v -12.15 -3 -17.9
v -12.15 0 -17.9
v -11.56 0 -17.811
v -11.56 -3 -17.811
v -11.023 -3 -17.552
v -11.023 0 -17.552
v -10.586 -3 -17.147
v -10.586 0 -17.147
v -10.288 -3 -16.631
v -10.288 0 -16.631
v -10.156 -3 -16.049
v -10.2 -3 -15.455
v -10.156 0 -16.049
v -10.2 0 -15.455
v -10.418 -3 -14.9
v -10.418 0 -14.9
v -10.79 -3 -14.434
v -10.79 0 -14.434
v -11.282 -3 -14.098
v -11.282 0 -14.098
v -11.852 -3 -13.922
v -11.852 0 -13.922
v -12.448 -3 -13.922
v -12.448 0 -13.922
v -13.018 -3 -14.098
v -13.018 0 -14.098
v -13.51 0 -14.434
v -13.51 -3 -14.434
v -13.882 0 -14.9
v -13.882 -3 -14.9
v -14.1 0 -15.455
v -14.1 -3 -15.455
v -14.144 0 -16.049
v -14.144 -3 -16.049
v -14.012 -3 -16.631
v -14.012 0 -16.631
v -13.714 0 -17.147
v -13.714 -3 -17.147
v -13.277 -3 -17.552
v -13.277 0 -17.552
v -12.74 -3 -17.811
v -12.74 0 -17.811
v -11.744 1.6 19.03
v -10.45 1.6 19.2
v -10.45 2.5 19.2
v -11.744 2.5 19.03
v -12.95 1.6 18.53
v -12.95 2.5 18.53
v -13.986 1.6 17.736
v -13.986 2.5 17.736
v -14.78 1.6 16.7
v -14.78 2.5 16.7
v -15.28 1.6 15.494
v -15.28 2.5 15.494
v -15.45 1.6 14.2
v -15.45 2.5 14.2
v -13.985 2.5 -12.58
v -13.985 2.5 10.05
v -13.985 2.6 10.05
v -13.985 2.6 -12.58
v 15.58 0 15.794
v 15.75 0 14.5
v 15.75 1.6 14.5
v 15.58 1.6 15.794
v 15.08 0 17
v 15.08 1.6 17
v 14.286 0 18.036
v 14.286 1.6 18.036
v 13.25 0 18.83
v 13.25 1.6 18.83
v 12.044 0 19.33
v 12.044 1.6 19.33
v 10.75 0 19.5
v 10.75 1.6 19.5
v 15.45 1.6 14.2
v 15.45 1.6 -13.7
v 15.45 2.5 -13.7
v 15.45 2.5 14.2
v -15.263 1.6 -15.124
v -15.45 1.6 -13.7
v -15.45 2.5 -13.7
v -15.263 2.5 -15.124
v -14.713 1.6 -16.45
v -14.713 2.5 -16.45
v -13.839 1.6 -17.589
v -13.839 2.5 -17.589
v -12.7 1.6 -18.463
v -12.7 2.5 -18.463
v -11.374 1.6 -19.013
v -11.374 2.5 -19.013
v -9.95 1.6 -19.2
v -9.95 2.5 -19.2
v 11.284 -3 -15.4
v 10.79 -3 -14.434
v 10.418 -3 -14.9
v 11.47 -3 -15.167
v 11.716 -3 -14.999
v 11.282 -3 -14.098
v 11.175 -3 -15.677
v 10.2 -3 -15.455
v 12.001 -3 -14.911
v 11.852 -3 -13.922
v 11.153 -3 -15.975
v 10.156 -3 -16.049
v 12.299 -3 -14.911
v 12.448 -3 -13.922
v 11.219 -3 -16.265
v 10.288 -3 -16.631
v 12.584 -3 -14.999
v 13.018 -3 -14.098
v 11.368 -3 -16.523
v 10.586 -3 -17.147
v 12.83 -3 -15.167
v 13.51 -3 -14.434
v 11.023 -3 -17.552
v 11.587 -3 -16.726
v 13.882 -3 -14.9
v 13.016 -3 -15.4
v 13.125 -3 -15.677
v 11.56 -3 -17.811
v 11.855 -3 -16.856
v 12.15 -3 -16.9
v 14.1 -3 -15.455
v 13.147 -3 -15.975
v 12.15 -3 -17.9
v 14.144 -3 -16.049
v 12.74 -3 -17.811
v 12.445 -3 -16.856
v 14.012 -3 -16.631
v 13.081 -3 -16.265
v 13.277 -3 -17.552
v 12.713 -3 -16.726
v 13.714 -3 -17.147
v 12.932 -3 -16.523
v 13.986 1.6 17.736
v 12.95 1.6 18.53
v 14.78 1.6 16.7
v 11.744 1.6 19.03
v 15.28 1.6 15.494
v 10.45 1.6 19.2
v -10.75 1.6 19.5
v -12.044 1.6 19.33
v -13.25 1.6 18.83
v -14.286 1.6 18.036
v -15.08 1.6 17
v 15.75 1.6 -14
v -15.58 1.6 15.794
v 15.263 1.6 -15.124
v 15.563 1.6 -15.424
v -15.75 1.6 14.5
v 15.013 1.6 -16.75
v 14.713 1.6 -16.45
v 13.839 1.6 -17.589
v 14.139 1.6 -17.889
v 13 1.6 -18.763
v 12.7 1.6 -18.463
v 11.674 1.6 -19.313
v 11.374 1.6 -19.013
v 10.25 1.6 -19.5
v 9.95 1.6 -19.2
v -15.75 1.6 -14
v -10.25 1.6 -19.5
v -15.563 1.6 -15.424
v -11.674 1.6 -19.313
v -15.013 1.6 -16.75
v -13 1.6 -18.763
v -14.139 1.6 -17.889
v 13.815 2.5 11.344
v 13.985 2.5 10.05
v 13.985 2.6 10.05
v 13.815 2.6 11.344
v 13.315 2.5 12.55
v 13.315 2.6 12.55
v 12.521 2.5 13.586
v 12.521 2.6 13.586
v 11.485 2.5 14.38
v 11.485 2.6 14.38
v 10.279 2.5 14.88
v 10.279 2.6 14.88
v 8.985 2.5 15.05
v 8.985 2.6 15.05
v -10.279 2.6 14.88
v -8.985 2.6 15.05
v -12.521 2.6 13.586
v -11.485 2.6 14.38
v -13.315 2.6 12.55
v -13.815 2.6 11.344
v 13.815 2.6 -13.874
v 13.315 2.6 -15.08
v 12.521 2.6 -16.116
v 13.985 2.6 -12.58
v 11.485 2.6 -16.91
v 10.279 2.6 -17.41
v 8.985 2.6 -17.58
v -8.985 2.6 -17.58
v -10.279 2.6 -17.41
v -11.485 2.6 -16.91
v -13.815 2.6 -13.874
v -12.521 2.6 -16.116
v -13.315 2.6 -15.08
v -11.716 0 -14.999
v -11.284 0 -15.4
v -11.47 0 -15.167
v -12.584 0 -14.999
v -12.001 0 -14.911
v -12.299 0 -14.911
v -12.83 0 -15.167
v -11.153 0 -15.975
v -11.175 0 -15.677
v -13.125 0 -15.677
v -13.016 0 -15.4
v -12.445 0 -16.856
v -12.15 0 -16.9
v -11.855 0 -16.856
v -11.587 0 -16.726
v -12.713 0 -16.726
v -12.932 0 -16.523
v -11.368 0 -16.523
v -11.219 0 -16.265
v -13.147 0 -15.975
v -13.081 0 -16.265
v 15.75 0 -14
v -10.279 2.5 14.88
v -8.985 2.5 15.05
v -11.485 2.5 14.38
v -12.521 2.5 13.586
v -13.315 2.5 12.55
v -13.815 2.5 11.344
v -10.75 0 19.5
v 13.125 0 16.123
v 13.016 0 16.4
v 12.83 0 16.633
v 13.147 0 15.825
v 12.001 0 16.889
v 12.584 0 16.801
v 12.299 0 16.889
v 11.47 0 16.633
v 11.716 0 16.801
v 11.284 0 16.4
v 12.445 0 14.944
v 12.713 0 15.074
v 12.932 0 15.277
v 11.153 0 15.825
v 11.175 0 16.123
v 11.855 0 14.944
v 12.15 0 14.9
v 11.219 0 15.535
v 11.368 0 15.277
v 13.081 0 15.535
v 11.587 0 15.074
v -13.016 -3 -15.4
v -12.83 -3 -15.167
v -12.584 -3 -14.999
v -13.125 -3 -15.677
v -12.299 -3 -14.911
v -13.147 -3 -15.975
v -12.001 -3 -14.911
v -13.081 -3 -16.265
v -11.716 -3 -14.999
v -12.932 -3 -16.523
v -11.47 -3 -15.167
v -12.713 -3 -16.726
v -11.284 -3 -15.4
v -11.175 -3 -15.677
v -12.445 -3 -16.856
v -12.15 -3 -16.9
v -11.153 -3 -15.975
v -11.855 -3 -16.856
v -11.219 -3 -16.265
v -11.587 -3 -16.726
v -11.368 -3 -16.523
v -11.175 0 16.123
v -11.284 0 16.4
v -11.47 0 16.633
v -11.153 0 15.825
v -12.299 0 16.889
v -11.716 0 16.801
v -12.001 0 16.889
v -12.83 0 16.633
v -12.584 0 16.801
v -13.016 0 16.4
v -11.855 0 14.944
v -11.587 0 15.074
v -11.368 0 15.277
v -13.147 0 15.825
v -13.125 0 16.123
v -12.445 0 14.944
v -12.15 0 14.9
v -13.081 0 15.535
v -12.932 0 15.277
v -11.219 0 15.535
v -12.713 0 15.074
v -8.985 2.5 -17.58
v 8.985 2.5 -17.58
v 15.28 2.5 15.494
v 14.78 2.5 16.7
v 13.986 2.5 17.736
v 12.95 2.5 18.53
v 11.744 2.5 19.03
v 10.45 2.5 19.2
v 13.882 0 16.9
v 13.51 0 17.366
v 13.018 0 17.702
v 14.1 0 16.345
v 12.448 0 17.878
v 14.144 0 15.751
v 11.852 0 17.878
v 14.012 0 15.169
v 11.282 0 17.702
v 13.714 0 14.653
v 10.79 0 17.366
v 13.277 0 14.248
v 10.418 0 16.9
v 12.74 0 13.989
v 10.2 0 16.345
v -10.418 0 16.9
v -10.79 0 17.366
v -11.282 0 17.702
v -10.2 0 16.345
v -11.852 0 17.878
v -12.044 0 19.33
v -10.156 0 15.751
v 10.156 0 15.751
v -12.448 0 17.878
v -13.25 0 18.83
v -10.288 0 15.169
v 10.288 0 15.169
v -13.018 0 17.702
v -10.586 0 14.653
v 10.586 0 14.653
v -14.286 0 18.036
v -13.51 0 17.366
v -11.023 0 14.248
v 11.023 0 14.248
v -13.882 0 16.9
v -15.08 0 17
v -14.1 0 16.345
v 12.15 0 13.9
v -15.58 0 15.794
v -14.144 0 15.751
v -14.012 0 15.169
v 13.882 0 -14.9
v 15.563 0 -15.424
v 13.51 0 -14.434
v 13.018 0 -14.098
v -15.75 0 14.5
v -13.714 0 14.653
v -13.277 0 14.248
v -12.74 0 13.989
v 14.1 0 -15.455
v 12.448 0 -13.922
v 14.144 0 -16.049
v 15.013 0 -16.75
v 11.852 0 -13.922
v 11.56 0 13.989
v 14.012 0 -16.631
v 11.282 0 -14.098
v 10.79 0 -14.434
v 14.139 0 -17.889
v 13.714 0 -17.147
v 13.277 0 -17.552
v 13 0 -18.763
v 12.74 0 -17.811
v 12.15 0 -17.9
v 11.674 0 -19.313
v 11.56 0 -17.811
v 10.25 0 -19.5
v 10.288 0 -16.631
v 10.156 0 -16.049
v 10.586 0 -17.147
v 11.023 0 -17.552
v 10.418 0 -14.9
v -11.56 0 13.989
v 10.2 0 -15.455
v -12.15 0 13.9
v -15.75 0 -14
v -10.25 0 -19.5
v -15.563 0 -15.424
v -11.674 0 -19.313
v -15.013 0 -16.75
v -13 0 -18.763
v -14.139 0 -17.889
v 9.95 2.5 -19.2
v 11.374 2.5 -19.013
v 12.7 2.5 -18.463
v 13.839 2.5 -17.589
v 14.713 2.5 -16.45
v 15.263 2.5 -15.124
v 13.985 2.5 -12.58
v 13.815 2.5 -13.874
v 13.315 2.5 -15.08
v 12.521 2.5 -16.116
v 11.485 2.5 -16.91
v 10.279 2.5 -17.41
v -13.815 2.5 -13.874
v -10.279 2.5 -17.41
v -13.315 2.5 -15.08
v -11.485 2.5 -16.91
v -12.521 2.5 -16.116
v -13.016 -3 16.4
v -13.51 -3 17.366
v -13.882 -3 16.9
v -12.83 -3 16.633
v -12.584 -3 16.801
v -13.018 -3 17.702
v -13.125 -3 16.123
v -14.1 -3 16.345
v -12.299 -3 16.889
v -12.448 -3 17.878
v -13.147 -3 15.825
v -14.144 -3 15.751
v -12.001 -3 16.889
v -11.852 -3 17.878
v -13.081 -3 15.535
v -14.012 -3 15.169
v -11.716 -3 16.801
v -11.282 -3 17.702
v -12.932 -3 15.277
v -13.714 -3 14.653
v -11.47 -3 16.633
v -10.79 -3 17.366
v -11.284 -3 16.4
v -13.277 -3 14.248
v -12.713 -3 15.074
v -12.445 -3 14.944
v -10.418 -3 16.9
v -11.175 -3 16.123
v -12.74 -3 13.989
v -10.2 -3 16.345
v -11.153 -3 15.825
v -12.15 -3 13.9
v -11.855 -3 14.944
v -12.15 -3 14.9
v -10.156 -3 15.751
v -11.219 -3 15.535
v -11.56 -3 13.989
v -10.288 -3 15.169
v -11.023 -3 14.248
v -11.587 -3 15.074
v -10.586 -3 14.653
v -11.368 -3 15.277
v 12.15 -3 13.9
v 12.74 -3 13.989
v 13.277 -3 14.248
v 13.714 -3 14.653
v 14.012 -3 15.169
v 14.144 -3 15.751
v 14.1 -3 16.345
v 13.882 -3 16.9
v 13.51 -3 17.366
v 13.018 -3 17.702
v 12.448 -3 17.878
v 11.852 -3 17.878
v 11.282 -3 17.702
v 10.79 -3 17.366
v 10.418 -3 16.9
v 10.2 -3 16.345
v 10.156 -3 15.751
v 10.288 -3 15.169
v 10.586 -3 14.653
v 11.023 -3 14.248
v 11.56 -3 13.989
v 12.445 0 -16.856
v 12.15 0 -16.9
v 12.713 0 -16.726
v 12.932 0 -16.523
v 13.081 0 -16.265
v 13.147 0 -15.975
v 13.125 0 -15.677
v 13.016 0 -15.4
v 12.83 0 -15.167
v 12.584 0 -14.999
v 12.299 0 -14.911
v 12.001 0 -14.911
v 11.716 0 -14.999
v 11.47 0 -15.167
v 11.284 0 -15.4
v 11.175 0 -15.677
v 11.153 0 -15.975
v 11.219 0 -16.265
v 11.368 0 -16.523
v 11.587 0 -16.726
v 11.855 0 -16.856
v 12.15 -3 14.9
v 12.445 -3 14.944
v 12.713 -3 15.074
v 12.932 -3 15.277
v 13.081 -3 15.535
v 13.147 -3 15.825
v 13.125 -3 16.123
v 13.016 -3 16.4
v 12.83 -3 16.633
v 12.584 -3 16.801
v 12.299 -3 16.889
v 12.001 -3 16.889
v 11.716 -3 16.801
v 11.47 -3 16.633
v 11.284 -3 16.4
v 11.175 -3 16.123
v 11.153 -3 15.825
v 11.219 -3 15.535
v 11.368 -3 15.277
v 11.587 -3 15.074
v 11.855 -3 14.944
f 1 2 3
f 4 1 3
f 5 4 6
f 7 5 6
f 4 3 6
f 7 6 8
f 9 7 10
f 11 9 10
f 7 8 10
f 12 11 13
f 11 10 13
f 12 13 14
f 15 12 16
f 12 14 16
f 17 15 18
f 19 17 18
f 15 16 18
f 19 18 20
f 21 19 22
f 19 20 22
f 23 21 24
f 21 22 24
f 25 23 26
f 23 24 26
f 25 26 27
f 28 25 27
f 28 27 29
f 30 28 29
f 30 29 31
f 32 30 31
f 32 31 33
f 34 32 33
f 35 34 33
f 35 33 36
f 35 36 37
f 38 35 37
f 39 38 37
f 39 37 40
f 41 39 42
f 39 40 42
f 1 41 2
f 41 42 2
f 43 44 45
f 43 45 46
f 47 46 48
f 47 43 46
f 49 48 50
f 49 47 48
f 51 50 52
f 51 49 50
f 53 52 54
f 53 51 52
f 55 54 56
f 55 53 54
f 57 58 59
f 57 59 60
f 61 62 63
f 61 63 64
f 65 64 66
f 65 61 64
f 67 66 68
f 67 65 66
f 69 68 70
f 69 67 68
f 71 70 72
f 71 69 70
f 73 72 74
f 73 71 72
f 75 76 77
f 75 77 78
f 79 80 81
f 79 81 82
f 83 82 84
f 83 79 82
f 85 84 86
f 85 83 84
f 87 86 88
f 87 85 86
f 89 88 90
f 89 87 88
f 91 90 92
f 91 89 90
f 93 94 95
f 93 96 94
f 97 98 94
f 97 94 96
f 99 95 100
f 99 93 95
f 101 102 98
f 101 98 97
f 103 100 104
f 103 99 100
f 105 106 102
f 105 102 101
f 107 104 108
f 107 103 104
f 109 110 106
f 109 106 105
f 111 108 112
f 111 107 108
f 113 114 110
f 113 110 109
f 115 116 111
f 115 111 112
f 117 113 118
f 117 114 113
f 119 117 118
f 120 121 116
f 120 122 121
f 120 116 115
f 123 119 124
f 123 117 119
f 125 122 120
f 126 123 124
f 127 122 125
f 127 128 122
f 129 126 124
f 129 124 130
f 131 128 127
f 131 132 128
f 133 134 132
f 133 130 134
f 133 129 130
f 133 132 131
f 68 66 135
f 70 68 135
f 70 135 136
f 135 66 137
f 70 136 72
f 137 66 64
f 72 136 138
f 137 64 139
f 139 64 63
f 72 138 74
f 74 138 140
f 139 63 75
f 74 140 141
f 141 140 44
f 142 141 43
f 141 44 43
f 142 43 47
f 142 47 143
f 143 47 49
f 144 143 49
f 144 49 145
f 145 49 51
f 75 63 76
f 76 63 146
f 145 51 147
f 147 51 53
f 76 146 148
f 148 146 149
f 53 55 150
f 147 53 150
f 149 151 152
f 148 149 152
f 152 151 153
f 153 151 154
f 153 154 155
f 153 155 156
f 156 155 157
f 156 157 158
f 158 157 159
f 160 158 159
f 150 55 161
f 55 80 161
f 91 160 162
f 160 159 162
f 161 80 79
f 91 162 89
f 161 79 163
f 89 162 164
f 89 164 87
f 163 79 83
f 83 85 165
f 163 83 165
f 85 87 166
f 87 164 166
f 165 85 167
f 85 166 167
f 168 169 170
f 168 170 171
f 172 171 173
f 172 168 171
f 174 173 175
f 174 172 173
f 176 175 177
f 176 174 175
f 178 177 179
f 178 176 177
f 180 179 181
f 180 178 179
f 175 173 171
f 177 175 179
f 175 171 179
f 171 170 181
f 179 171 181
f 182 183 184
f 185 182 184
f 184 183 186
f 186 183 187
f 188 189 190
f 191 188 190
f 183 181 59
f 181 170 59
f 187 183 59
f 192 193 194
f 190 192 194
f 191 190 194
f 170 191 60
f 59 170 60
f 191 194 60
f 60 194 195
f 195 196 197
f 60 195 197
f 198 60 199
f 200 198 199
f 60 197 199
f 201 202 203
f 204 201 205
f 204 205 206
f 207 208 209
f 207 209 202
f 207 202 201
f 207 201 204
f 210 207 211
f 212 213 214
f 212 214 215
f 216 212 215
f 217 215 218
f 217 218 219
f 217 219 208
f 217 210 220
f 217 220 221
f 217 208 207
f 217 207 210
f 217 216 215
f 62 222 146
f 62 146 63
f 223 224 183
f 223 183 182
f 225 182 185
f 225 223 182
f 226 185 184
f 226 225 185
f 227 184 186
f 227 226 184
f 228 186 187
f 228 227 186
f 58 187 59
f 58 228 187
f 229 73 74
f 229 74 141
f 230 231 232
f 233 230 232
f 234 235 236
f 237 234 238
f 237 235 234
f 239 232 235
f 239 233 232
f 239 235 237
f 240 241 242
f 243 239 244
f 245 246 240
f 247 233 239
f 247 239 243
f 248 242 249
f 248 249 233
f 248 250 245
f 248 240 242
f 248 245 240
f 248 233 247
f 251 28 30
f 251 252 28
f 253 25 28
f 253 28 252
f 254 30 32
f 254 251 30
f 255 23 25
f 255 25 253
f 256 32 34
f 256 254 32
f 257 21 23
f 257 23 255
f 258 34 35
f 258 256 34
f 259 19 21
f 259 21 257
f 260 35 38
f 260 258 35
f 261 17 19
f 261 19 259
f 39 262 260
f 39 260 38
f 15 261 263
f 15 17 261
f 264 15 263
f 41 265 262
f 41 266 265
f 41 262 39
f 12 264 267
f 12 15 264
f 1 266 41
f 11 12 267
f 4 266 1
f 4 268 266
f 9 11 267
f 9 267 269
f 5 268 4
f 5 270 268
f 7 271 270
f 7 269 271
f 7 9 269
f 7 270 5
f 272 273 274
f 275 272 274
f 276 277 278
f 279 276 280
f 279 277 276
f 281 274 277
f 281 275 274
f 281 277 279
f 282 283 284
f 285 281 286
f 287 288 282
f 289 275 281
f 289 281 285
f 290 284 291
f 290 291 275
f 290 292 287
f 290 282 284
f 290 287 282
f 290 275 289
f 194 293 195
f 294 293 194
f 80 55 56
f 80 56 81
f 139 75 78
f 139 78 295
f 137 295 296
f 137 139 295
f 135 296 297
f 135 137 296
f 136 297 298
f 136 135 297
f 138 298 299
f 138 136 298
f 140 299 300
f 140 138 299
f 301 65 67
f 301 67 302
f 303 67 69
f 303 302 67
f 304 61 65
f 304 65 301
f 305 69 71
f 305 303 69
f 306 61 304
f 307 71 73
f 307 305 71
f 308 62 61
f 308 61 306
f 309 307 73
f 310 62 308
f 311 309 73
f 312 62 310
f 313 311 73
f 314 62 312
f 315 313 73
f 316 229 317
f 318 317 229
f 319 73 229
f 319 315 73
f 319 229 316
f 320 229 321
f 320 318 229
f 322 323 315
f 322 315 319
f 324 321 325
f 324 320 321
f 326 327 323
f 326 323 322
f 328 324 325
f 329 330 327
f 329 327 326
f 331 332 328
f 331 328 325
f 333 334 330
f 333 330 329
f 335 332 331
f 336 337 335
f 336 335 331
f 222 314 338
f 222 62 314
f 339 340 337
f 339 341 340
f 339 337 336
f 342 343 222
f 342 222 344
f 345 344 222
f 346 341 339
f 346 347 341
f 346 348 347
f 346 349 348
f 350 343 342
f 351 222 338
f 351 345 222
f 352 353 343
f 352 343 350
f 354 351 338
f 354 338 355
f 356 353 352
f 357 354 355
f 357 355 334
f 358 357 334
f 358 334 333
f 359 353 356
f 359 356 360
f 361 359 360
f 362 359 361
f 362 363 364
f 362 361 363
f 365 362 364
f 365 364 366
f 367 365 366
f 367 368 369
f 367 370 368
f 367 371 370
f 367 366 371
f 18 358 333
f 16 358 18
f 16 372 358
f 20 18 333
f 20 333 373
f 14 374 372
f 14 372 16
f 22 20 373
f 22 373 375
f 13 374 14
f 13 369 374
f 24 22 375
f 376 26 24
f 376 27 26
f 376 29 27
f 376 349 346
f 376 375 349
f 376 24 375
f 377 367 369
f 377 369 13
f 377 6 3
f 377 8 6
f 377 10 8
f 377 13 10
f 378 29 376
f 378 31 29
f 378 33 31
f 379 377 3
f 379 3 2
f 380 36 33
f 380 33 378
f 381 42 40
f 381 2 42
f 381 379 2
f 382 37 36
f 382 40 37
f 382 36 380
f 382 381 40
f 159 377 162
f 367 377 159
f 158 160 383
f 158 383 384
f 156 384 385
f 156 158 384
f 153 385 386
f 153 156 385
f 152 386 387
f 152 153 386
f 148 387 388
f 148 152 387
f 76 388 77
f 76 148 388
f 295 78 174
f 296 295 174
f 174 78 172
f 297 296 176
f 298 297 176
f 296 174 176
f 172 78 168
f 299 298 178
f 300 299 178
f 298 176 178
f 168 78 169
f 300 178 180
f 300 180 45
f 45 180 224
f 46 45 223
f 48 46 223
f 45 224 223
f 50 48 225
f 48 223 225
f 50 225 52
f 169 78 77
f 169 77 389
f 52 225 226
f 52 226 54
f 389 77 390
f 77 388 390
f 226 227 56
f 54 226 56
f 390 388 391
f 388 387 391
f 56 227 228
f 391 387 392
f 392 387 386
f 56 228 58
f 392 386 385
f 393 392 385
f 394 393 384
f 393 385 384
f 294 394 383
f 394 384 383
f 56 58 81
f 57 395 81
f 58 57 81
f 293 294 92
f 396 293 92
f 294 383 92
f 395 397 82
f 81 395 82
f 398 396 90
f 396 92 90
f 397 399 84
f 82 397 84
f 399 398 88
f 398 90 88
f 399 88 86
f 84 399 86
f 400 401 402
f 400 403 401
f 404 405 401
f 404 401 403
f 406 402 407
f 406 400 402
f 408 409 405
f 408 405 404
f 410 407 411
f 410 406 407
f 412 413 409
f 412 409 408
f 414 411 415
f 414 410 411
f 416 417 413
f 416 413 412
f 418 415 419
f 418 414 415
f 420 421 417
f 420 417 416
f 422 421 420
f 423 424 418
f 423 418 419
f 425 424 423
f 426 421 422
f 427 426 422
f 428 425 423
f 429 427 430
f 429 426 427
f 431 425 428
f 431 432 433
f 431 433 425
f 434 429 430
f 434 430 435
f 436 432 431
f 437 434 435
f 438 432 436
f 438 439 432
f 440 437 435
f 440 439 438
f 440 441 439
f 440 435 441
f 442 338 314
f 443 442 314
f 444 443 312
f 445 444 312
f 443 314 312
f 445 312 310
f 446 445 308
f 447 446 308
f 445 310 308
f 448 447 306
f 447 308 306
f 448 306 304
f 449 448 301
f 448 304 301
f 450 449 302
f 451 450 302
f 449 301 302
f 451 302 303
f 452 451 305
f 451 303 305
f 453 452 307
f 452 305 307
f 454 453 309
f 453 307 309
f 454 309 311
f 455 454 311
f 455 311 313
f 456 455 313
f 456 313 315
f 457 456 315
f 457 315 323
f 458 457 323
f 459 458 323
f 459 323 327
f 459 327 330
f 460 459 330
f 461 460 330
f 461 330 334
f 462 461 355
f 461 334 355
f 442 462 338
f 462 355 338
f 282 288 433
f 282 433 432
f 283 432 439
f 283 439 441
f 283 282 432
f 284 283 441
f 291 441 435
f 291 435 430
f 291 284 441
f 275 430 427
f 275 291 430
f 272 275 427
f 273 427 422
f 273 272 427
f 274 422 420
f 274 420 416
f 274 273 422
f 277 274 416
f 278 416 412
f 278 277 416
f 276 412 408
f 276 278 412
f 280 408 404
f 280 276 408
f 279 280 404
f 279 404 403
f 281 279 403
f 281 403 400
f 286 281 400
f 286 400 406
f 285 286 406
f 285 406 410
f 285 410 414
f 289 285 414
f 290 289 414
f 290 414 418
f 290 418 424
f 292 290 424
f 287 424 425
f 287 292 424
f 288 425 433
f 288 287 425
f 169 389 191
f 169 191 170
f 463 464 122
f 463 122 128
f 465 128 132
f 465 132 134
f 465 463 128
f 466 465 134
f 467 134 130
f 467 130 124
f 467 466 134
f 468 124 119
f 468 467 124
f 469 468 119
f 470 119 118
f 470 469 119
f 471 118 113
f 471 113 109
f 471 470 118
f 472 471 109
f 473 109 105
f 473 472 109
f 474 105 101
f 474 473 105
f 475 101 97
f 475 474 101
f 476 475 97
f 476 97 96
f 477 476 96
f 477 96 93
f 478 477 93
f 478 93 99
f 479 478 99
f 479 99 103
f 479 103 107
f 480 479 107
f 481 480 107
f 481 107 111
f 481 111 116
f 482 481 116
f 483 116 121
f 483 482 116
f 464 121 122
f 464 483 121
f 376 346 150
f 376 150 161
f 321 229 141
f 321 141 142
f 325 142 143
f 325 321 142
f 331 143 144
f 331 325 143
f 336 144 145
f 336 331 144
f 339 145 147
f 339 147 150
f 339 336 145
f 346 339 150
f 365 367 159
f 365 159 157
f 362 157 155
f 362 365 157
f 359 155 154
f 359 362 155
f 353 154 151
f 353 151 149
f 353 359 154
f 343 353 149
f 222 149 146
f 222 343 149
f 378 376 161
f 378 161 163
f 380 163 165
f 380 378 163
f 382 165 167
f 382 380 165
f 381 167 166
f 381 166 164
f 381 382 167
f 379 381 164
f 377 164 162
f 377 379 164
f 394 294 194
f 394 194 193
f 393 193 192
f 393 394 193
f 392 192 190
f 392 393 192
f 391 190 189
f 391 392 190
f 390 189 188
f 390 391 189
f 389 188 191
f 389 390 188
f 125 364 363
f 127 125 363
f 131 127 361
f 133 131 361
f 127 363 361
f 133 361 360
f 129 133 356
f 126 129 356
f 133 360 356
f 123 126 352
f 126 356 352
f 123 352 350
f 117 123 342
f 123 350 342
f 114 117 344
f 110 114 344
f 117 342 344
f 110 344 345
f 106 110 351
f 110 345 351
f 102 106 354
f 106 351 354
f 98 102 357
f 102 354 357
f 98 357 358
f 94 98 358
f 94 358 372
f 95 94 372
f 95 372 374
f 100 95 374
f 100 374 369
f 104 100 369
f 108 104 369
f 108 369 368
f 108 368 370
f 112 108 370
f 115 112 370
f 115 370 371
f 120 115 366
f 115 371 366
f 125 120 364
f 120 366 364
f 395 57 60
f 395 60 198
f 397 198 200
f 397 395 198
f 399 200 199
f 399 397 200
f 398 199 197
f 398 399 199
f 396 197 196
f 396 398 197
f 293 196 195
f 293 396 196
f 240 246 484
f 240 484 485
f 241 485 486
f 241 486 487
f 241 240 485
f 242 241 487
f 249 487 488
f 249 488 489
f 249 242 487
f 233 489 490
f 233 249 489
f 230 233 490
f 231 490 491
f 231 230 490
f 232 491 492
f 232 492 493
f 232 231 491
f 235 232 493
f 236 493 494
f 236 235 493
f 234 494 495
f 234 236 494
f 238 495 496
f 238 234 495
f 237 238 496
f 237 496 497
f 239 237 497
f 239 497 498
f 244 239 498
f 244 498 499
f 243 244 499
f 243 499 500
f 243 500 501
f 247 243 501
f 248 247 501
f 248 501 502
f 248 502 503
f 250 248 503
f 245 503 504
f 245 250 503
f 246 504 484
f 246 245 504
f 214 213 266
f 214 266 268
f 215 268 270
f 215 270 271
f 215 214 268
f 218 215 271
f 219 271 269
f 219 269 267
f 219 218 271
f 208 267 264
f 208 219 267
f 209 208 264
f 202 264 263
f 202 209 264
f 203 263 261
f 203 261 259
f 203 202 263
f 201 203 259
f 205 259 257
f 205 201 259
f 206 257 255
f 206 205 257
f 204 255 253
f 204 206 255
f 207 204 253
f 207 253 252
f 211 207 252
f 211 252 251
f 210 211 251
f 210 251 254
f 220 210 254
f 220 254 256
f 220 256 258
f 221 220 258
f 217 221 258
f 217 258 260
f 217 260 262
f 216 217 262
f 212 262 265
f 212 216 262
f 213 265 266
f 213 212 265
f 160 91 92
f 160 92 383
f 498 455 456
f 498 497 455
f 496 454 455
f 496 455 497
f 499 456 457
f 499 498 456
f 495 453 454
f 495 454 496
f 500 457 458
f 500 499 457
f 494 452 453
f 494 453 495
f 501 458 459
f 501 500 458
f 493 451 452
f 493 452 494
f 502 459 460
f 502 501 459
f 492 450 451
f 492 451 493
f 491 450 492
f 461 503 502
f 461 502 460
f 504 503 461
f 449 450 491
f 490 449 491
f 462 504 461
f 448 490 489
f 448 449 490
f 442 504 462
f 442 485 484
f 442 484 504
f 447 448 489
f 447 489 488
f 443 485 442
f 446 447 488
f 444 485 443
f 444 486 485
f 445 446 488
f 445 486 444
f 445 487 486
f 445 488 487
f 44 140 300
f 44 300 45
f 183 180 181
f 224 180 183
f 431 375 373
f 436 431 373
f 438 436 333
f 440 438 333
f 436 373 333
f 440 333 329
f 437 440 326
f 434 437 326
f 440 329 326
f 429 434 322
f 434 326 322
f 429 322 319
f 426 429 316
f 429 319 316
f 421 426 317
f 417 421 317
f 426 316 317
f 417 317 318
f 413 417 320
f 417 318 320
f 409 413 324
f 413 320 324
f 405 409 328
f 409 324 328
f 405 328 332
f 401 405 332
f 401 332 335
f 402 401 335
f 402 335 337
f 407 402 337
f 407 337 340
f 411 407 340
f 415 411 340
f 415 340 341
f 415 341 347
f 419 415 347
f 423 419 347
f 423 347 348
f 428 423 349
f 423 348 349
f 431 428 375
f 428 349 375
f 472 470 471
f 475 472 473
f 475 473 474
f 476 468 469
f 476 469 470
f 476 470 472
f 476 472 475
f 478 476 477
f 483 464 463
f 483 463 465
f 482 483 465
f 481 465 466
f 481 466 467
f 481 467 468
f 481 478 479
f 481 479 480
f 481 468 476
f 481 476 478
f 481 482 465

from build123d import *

# Parameters (mm, degrees)
EXTRUDE_1_DEPTH = 1.6
EXTRUDE_2_DEPTH = 1
EXTRUDE_3_DEPTH = 0.9
SKETCH_4_R      = 2
SKETCH_4_R_2    = 1
EXTRUDE_4_DEPTH = 3


with BuildPart() as part:
    # 草图1 → 凸台-拉伸1 (new body)
    with BuildSketch(Plane(origin=(0, 0, 0), x_dir=(1, 0, 0), z_dir=(0, 1, 0))):
        with BuildLine():
            Line((-10.25, 19.5), (10.25, 19.5))
            ThreePointArc((10.25, 19.5), (14.139087297, 17.889087297), (15.75, 14))
            Line((15.75, 14), (15.75, -14.5))
            ThreePointArc((15.75, -14.5), (14.285533906, -18.035533906), (10.75, -19.5))
            Line((10.75, -19.5), (-10.75, -19.5))
            ThreePointArc((-10.75, -19.5), (-14.285533906, -18.035533906), (-15.75, -14.5))
            Line((-15.75, -14.5), (-15.75, 14))
            ThreePointArc((-15.75, 14), (-14.139087297, 17.889087297), (-10.25, 19.5))
        make_face()
    extrude(amount=EXTRUDE_1_DEPTH)

    # 草图2 → 凸台-拉伸2 (add)
    with BuildSketch(Plane(origin=(0, 1.6, 0), x_dir=(1, 0, 0), z_dir=(0, 1, 0))):
        with BuildLine():
            Line((-8.985, 17.58), (8.985, 17.58))
            ThreePointArc((8.985, 17.58), (12.520533906, 16.115533906), (13.985, 12.58))
            Line((13.985, 12.58), (13.985, -10.05))
            ThreePointArc((13.985, -10.05), (12.520533906, -13.585533906), (8.985, -15.05))
            Line((8.985, -15.05), (-8.985, -15.05))
            ThreePointArc((-8.985, -15.05), (-12.520533906, -13.585533906), (-13.985, -10.05))
            Line((-13.985, -10.05), (-13.985, 12.58))
            ThreePointArc((-13.985, 12.58), (-12.520533906, 16.115533906), (-8.985, 17.58))
        make_face()
    extrude(amount=EXTRUDE_2_DEPTH)

    # 草图3 → 凸台-拉伸3 (add)
    with BuildSketch(Plane(origin=(0, 1.6, 0), x_dir=(1, 0, 0), z_dir=(0, 1, 0))):
        with BuildLine():
            Line((-9.95, 19.2), (9.95, 19.2))
            ThreePointArc((9.95, 19.2), (13.839087297, 17.589087297), (15.45, 13.7))
            Line((15.45, 13.7), (15.45, -14.2))
            ThreePointArc((15.45, -14.2), (13.985533906, -17.735533906), (10.45, -19.2))
            Line((10.45, -19.2), (-10.45, -19.2))
            ThreePointArc((-10.45, -19.2), (-13.985533906, -17.735533906), (-15.45, -14.2))
            Line((-15.45, -14.2), (-15.45, 13.7))
            ThreePointArc((-15.45, 13.7), (-13.839087297, 17.589087297), (-9.95, 19.2))
        make_face()
    extrude(amount=EXTRUDE_3_DEPTH)

    # 草图4 → 凸台-拉伸4 (add)
    # profile 1 of 4: a face of its own
    with BuildSketch(Plane.XZ):
        with Locations(Location((-12.15, 15.9, 0), (0, 0, 270))):
            Circle(SKETCH_4_R)
        with Locations(Location((-12.15, 15.9, 0), (0, 0, 270))):
            Circle(SKETCH_4_R_2, mode=Mode.SUBTRACT)
    # profile 2 of 4: a face of its own
    with BuildSketch(Plane.XZ):
        with Locations(Location((12.15, 15.9, 0), (0, 0, 270))):
            Circle(SKETCH_4_R)
        with Locations(Location((12.15, 15.9, 0), (0, 0, 270))):
            Circle(SKETCH_4_R_2, mode=Mode.SUBTRACT)
    # profile 3 of 4: a face of its own
    with BuildSketch(Plane.XZ):
        with Locations(Location((12.15, -15.9, 0), (0, 0, 270))):
            Circle(SKETCH_4_R)
        with Locations(Location((12.15, -15.9, 0), (0, 0, 270))):
            Circle(SKETCH_4_R_2, mode=Mode.SUBTRACT)
    # profile 4 of 4: a face of its own
    with BuildSketch(Plane.XZ):
        with Locations(Location((-12.15, -15.9, 0), (0, 0, 270))):
            Circle(SKETCH_4_R)
        with Locations(Location((-12.15, -15.9, 0), (0, 0, 270))):
            Circle(SKETCH_4_R_2, mode=Mode.SUBTRACT)
    extrude(amount=EXTRUDE_4_DEPTH)


solid = part.part
